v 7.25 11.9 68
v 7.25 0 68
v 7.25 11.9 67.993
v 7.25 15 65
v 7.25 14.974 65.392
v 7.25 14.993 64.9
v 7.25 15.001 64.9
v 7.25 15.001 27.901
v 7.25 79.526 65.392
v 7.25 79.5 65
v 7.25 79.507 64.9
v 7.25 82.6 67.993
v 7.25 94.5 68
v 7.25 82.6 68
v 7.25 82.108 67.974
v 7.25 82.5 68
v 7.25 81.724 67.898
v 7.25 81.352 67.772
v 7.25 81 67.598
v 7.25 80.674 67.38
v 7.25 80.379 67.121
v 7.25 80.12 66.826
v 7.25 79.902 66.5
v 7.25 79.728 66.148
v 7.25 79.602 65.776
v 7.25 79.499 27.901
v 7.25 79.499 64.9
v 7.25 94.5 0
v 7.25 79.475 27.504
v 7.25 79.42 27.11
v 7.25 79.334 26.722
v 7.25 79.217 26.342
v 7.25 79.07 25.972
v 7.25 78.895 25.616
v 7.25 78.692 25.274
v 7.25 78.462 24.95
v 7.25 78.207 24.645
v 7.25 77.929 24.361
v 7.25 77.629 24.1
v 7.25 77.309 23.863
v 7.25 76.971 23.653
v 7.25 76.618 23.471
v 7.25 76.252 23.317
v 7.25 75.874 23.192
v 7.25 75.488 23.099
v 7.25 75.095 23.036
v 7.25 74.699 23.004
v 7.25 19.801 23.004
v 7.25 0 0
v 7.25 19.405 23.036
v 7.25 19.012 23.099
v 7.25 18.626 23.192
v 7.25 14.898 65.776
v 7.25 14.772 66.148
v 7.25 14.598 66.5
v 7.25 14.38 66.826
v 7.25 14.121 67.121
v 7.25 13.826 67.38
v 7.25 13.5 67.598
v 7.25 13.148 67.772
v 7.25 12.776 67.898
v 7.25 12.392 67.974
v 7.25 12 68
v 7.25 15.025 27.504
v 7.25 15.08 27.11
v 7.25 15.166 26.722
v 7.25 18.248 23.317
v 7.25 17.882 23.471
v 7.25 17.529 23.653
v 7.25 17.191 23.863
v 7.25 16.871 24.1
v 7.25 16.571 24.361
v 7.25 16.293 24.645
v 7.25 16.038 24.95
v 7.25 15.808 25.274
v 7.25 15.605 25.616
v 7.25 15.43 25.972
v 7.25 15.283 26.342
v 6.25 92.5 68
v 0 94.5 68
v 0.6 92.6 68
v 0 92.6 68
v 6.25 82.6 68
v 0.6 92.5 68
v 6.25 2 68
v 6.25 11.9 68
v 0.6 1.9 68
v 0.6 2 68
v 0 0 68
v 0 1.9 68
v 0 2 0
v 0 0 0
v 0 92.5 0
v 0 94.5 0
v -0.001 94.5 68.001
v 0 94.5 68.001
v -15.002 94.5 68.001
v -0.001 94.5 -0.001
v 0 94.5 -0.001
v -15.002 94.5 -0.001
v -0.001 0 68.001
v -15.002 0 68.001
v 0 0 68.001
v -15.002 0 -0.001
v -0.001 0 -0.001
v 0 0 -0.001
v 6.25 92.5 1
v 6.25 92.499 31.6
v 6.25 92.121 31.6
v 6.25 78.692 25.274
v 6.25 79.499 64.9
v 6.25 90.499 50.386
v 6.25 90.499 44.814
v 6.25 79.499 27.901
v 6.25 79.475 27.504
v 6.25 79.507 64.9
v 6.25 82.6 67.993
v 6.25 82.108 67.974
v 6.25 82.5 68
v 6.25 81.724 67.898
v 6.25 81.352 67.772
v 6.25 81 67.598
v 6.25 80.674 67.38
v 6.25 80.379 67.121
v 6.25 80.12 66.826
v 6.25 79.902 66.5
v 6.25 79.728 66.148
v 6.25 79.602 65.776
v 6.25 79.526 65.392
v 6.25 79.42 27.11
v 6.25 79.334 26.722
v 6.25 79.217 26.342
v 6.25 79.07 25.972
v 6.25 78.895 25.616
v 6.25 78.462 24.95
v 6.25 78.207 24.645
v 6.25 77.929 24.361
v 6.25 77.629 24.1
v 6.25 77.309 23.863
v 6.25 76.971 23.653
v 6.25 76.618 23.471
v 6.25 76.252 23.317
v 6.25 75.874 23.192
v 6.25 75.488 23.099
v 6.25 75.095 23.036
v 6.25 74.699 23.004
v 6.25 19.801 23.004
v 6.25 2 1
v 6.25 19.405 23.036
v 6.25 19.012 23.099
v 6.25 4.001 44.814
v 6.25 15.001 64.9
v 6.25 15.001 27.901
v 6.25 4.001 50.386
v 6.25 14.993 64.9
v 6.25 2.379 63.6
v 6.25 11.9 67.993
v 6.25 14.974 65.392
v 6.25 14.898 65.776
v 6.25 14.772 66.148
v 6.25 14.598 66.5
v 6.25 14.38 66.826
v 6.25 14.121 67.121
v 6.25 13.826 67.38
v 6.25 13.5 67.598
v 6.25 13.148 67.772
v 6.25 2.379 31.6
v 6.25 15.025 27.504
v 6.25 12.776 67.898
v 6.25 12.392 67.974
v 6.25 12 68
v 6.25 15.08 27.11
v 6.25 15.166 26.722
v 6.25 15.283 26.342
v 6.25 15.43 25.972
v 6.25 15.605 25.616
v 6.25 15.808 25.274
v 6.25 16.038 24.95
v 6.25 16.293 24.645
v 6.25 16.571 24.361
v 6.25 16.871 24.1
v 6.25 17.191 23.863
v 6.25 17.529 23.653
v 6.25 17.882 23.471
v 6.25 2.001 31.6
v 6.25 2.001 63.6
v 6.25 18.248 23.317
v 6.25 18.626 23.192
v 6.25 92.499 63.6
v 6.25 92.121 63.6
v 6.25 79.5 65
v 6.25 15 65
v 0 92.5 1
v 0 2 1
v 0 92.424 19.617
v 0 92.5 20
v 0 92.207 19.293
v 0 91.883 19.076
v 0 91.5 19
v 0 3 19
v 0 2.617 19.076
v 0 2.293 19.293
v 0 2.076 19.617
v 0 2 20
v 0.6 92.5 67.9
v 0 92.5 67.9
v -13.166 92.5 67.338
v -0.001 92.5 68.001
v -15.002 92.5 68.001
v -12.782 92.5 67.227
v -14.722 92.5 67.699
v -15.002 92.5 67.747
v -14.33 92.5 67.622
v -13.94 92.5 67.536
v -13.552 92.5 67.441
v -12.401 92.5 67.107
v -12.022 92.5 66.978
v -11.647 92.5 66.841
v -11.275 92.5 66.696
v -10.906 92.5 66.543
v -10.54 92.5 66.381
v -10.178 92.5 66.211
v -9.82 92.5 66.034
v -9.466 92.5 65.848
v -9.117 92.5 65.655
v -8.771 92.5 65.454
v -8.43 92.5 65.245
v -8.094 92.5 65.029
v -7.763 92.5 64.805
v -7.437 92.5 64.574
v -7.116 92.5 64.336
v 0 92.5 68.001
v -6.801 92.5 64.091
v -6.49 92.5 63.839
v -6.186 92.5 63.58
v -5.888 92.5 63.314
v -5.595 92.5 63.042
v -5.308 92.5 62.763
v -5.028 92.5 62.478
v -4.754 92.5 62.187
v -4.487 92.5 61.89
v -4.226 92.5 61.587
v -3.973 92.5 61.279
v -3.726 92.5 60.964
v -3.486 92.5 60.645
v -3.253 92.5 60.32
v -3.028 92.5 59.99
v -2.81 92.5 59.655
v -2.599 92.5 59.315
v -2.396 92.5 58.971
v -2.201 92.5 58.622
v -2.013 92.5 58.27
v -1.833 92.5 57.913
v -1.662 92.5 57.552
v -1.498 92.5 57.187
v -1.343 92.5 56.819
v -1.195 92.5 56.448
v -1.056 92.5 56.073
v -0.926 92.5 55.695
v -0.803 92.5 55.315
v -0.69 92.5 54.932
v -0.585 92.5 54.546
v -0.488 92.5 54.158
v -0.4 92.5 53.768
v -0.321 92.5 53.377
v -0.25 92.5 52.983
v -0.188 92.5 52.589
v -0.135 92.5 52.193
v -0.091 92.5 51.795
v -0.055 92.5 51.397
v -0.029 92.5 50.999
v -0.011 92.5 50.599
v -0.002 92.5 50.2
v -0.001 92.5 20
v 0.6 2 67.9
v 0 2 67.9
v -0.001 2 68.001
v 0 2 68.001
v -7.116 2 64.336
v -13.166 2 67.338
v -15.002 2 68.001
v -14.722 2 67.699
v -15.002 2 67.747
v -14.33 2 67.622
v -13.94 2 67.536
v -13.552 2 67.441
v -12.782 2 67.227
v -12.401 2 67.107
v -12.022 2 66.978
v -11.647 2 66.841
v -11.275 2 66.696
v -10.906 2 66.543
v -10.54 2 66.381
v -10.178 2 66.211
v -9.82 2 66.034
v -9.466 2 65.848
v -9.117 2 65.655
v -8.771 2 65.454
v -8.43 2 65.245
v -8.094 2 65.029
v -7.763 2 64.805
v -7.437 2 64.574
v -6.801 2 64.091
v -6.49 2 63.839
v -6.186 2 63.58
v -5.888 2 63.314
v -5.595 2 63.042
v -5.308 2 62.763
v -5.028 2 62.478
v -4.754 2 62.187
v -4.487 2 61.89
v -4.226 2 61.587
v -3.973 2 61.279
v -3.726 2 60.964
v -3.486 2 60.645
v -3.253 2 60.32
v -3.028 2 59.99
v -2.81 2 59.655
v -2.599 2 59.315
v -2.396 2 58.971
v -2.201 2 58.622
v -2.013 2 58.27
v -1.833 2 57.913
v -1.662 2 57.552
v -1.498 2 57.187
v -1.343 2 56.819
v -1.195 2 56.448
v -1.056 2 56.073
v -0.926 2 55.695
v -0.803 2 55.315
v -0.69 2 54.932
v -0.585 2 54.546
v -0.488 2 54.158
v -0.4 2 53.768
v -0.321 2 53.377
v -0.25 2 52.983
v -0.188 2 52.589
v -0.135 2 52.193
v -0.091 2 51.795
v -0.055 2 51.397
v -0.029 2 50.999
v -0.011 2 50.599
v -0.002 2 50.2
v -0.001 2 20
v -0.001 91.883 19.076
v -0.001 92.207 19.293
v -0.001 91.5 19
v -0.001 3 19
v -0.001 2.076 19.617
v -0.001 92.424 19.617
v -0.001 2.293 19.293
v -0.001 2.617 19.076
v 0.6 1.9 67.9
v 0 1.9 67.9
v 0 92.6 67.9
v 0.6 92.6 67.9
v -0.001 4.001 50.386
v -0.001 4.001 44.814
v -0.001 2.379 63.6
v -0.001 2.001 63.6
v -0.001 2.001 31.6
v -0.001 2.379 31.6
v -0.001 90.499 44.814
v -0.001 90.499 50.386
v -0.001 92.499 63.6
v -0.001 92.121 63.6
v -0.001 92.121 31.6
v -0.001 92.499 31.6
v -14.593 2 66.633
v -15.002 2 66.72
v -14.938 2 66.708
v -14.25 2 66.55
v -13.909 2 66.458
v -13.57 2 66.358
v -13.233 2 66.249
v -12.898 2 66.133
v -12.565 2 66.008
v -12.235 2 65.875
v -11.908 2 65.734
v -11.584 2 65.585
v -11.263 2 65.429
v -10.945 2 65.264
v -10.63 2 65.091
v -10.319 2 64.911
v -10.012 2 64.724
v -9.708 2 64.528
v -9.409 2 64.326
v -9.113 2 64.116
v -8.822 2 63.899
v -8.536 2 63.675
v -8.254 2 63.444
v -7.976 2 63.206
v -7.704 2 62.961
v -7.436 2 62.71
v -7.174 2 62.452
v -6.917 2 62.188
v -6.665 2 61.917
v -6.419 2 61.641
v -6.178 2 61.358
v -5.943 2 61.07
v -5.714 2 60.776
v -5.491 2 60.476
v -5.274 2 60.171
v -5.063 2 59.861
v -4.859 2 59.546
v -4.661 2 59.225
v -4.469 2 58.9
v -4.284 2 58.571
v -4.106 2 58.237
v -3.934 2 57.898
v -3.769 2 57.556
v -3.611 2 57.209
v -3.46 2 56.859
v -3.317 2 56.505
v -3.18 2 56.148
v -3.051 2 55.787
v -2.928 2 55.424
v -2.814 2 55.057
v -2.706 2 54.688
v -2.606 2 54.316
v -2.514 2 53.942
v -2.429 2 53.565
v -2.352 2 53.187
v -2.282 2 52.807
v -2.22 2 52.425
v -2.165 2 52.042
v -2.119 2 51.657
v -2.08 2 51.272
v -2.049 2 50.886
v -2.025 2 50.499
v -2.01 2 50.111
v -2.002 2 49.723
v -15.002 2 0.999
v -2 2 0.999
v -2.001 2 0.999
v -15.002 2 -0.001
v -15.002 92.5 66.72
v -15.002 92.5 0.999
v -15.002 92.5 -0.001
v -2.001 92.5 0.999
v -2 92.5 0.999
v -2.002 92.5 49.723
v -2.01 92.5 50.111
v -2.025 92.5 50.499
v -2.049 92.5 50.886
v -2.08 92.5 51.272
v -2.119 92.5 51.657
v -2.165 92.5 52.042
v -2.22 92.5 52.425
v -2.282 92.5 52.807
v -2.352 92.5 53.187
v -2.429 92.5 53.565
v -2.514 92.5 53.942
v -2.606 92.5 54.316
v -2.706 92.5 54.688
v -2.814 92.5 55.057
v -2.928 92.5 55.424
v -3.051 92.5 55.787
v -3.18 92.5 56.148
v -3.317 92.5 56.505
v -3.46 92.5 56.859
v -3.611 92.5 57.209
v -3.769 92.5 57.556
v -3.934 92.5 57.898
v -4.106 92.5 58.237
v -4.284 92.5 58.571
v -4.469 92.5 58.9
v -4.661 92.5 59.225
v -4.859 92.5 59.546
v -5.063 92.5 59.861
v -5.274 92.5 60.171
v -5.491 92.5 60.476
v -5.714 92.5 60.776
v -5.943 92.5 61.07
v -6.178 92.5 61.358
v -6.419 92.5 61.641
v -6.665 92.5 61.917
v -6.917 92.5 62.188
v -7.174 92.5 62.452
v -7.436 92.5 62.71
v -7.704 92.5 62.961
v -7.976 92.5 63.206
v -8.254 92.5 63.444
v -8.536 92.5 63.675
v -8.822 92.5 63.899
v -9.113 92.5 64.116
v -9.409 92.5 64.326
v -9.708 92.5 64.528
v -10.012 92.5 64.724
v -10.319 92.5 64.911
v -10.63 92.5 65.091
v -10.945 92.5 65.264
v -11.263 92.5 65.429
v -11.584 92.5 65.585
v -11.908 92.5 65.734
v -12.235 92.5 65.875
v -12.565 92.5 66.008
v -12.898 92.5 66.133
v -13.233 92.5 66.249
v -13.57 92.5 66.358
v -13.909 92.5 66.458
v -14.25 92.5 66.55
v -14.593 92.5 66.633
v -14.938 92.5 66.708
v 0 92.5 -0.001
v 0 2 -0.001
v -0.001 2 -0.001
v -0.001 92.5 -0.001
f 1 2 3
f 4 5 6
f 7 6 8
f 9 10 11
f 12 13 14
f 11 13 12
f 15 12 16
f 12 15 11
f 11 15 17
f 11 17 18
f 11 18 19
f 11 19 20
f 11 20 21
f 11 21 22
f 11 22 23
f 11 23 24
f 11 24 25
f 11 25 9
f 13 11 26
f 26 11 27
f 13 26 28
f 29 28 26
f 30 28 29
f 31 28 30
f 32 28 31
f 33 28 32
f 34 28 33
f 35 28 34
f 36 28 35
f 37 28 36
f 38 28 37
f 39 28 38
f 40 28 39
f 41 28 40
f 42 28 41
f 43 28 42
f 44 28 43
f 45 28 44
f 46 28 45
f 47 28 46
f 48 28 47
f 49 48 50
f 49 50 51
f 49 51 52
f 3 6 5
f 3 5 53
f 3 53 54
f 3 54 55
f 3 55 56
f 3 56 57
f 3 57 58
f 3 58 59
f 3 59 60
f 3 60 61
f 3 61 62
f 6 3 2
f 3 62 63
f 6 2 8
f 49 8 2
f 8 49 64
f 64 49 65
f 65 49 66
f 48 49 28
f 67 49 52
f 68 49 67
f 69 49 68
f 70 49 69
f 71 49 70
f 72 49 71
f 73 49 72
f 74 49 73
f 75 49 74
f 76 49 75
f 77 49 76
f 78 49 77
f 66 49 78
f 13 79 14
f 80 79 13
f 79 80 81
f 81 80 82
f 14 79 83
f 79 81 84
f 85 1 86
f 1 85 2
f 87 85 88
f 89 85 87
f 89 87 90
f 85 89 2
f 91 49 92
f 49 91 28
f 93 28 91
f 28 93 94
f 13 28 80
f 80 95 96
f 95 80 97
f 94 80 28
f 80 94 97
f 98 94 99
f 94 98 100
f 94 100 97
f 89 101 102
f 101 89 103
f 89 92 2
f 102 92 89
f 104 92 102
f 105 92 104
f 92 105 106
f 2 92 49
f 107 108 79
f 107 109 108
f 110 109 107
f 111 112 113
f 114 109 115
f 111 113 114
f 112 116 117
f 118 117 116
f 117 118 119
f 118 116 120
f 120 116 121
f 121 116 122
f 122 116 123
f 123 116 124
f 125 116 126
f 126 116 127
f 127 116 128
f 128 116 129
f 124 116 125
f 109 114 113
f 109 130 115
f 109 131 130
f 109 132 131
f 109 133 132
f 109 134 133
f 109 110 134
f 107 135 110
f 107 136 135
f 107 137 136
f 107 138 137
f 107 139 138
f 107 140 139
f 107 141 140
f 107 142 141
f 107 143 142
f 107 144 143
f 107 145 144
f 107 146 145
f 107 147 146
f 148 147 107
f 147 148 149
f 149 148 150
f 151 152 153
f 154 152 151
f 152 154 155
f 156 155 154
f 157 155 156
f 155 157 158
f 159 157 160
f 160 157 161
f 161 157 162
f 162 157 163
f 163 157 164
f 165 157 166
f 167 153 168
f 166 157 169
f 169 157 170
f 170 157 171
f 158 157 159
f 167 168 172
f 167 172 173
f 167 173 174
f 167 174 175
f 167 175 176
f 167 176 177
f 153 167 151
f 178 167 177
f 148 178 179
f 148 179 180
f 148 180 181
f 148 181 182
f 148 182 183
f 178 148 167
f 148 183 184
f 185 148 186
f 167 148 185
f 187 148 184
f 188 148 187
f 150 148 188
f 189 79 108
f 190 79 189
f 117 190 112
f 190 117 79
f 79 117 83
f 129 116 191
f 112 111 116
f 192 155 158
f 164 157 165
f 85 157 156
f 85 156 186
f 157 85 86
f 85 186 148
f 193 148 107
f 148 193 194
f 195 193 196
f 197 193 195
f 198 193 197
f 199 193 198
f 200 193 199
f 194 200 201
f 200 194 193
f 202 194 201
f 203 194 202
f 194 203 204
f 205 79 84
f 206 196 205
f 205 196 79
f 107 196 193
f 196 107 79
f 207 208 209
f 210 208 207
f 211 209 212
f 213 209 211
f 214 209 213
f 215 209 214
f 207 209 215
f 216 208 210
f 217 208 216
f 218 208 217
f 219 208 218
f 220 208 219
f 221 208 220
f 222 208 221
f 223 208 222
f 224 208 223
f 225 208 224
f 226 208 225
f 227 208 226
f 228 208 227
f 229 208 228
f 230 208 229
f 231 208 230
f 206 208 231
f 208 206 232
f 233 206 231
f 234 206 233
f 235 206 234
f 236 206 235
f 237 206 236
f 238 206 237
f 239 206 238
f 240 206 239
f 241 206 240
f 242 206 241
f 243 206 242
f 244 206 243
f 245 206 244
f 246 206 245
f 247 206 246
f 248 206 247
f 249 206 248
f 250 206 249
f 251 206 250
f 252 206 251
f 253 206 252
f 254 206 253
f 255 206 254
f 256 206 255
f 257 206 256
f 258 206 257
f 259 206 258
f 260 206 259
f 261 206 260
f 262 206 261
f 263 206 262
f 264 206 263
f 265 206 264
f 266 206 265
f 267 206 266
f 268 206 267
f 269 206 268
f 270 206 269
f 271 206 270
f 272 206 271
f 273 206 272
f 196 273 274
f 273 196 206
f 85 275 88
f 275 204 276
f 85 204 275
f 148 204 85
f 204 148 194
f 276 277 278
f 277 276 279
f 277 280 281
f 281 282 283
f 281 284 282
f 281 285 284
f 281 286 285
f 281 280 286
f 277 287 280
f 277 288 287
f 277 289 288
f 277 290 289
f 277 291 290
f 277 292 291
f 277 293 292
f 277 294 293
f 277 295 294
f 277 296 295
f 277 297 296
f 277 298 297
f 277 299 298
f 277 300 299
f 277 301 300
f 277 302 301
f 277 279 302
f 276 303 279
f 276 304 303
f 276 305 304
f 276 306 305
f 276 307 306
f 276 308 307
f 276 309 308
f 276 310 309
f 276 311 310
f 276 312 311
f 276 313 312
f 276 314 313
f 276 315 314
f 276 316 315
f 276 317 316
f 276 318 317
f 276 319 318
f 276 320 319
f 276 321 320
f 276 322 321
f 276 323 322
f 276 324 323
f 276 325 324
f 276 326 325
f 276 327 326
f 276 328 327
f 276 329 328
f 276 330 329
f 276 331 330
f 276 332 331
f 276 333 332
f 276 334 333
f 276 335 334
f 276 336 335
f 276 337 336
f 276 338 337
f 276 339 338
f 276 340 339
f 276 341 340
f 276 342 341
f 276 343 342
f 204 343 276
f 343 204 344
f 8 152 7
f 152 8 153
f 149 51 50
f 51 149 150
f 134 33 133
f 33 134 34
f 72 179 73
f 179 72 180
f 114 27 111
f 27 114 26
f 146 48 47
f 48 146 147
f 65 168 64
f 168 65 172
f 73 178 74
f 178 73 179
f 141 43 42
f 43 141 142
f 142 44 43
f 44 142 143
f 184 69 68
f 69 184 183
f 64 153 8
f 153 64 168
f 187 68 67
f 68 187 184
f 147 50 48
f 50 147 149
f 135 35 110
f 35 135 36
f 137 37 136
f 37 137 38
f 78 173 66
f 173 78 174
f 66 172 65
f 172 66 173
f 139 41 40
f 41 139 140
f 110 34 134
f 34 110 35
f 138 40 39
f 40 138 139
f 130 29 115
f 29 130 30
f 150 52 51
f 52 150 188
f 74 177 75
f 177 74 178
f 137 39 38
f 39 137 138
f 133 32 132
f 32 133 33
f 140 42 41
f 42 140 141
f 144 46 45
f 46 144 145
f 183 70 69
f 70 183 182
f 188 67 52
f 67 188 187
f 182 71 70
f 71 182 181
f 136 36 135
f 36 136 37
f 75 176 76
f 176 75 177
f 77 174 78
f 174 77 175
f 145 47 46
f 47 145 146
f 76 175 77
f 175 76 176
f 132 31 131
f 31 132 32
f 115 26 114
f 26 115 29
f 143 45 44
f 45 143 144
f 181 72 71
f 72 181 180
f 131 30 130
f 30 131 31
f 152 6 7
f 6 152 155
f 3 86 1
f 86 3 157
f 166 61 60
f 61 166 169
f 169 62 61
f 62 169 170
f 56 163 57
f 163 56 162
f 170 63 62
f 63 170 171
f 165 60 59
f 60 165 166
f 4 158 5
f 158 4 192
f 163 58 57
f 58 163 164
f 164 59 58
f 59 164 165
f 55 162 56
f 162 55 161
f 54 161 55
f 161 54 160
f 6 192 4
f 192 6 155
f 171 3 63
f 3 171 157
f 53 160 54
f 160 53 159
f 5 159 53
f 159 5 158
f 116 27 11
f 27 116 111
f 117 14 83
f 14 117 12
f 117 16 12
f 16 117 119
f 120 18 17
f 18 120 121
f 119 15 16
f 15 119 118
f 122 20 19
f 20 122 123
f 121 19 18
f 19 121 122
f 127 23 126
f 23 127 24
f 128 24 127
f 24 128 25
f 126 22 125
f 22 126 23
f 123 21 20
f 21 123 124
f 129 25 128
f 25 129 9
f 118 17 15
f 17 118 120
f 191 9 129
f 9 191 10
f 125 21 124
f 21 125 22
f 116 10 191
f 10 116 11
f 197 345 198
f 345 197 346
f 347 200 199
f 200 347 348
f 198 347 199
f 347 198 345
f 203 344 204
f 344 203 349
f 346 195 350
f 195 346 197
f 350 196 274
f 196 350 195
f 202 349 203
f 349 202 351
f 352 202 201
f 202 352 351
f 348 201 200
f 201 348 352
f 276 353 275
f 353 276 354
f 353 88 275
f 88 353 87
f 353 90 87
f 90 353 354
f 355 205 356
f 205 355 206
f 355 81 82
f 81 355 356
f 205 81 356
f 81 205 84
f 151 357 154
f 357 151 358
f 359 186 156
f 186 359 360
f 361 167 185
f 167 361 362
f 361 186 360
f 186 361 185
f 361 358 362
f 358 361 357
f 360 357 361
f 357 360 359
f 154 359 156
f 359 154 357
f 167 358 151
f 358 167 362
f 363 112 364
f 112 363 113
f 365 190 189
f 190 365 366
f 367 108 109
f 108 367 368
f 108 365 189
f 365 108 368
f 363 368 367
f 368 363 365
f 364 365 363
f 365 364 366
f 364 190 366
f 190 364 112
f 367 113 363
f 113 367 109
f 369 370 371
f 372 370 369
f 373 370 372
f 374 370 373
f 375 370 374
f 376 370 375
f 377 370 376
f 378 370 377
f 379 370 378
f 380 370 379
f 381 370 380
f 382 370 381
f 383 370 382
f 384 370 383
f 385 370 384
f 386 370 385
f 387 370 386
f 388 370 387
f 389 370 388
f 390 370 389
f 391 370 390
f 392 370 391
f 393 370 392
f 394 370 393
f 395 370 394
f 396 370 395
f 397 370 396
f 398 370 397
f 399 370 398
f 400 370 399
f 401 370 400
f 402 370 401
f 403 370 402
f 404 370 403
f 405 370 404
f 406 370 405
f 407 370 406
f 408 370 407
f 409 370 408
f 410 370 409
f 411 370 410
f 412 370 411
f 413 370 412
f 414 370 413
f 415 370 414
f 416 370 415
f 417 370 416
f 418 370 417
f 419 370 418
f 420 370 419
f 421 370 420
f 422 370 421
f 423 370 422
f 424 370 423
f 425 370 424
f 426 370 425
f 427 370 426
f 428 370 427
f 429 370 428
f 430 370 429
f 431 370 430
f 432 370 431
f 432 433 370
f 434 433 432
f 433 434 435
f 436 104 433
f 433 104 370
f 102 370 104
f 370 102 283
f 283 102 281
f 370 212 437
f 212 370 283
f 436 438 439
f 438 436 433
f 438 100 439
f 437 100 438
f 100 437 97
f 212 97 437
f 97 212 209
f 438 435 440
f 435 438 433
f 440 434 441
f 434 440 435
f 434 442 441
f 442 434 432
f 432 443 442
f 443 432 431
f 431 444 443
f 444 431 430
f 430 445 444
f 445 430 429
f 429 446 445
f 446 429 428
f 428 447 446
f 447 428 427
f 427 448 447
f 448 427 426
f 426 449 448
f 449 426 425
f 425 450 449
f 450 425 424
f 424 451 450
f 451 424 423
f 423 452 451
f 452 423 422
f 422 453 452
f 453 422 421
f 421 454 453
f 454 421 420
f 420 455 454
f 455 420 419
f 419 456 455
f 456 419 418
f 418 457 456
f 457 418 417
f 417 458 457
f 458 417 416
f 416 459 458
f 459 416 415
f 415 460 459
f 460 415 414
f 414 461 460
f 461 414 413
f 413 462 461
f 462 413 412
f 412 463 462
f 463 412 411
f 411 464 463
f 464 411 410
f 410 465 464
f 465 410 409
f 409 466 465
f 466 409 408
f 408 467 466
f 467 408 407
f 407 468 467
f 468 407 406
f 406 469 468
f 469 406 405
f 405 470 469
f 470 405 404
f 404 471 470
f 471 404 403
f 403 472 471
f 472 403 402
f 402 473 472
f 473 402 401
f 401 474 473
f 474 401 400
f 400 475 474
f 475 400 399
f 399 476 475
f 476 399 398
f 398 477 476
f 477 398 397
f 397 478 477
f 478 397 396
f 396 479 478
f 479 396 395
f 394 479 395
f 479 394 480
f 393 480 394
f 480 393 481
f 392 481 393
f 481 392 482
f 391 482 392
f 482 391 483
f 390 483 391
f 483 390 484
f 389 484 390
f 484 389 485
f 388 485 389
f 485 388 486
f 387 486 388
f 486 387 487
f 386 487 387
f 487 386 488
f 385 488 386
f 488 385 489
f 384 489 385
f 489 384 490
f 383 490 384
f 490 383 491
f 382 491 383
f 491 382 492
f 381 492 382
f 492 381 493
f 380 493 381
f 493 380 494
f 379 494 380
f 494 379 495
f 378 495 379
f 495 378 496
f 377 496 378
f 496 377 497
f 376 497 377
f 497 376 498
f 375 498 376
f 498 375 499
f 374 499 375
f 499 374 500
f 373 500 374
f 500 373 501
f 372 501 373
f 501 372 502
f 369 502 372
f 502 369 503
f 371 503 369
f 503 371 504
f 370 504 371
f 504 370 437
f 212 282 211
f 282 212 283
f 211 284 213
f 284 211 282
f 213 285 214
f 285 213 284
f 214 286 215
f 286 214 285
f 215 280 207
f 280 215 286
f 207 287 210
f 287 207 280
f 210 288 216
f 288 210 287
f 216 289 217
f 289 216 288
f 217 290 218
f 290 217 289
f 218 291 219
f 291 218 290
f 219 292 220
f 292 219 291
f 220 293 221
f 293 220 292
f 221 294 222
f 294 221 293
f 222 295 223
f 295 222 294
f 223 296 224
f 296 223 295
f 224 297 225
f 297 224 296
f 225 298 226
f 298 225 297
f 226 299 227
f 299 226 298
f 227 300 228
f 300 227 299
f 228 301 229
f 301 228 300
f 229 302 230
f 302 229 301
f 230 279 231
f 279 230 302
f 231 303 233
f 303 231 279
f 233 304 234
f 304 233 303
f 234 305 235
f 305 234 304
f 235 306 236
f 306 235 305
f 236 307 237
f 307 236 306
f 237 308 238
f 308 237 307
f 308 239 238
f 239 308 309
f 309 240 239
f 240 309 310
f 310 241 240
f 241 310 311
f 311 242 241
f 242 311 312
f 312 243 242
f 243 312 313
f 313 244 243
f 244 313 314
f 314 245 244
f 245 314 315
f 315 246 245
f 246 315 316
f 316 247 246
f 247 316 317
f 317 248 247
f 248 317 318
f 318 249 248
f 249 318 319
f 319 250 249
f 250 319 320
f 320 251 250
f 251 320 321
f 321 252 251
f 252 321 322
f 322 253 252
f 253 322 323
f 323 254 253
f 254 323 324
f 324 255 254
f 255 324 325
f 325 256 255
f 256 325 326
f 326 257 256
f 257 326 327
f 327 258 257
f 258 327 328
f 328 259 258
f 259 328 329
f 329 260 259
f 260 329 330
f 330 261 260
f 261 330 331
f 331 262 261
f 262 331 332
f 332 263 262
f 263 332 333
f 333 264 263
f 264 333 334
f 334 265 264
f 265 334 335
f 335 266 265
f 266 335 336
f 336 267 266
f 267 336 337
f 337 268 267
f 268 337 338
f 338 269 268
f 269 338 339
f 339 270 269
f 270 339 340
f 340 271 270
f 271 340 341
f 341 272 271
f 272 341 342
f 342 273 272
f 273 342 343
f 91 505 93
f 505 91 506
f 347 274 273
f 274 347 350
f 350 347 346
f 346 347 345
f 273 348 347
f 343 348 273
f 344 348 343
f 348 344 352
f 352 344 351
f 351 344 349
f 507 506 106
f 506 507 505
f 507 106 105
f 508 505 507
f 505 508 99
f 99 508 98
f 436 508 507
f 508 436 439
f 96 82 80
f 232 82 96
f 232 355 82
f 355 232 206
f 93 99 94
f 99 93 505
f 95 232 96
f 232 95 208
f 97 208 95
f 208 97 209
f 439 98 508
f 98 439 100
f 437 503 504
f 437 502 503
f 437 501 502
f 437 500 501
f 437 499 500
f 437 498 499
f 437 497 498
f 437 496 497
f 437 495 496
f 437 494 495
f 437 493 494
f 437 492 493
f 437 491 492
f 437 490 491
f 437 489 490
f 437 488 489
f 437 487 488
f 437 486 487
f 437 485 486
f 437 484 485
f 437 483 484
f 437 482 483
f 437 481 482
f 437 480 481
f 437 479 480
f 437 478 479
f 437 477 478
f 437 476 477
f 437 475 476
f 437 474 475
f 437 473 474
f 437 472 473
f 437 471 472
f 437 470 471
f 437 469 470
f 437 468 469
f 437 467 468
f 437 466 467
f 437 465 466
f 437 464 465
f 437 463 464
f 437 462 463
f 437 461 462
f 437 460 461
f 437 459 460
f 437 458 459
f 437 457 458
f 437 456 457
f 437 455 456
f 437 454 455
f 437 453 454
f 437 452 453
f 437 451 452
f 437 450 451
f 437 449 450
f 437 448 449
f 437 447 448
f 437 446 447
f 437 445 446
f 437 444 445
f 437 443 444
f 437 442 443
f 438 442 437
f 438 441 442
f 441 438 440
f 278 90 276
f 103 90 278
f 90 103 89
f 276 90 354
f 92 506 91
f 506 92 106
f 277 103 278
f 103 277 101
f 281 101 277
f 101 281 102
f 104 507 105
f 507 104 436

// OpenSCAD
// cubitos
use <mylib.scad>;

p = .001;
pp = 2 * p;
t0 = 1;
f = .18;
sqrt3 = sqrt(3);    // 1.732
sqrt3_2 = sqrt3/2;  // .866

// box size and placement constraint (3x4 grid in square box)
wmax = 285/4;    // 95 (w0 < wmax)
hmax = 285/3;    // 71 (h0 < hmax)

w00 = 88;  // official card size [long dimension]
h00 = 63;  // official card size [short dimension]

t00 = .4;  // card thickness: sleeves bring thickness to ~.625 per card. (from min .4mm)
t01 = .625; // thickness when stacking sleeved cards 

// euroPoker size (with sleeves):
// width of card
w0 = 90.5;
// height of card
h0 = 66;
bt = 10 * t01 + 2 * t0; //
bw = w0; // total length of box (y-extent @ loc = 2)
bh = h0; // height of box (short dimension of card + bottom(t0) + top(3mm))


// box for setup (Events, VICI, markers, chips) cards:
// vt = box thick (~ t01 * number of cards + 2*t0) x-extent
// vw = box width (long dimension of card + 2*t0)  y-extent
// vh = box height (short dimension of card + bottom(t0) + top(3mm)) z-extent
module vbox(vt0 = bt, vw0 = bw, vh0 = bh, txyz = t0)
{
  ta = is_list(txyz) ? txyz : [txyz, txyz, txyz];
  tx = ta.x; ty = ta.y; tz = ta.z;
  vt = vt0 + 2 * tx; // external x-extent
  vw = vw0 + 2 * ty;
  vh = vh0 + 2 * tz;
  echo("------ vbox: vt= ", vt, "vw=", vw, "vh=", vh);
  // vt: interior x-extent
  module cardGuide(vt = vt0+pp) {
    // w0 size of inset; squeeze
    // h0 height of flat part
    // h1 height of taper part
    w0 = 2; h0 = 4; h1 = 7; a = 7;
    vh2 = vh * .7;
    // TODO: the trig to calc height of green cube (depends on angle a)
    difference() {
    translate([w0/2 + p, 0, vh2]) color("green") cube([w0, vt, h0 + 4 * h1], true);
    trr([w0, 0, vh2+h1+h0, [0, -a, 0]]) color ("pink") cube([w0, vt+pp, h0 + 2 * h1], true);
    trr([w0, 0, vh2-h1-h0, [0, a, 0]]) color ("pink") cube([w0, vt+pp, h0 + 2 * h1], true);
    }
  }
  // slotify the walls:
  vl = vt;
  sw = vw-30;   // width of slot 
  dh = 50;      // depth of slot (below the radius of tray)
  sr = min(5, dh/2, sw/2); // radius of slot
  hwtr0 = [dh, vw-2*ty, 2*tz, 1]; // ]height, width, translate, rotate]
  hwtr1 = [dh, vw-30, 2*tz, sr]; // ]height, width, translate, rotate]
  ss = false;   // show slot

  { 
    // slotted box with card guides:
    slotify(hwtr0, [00+tx/2, vw/2, vh-(dh/2-tz)], 1, 0, ss)
    slotify(hwtr1, [vl-tx/2, vw/2, vh-(dh/2-sr)], 1, 3, ss)
    box([vt, vw, vh], ta);
    translate([vt/2,  0+ty, 0 ]) rotate([0,0, 90]) cardGuide();
    translate([vt/2, vw-ty, 0 ]) rotate([0,0,-90]) cardGuide();
  }
}

// tray is a rounded tube (kut) with end caps [from civo_tray]
// size: [x: length, y: width_curved, z: height_curved]
// rt: radii of tray [bl, tl, tr, br]
// rc: radii of caps
// k0: cut_end default: cut max(top radii) -> k
// txyz: (t0 -> [t0, t0, t0])
module tray(size = 10, rt = 2, rc = 0, k0, txyz = t0) {
 ta = is_list(txyz) ? txyz : [txyz, txyz, txyz];
 s0 = is_list(size) ? size : [size, size, size]; // tube_size
 s = [s0.x, s0.y, s0.z];
 rm = is_list(rt) ? max(rt[1], rt[2]) : rt;   // round_max of tl, bl
 k = is_undef(k0) ? -rm : k0;
 translate([s[0], 0, 0])
 rotate([0, -90, 0])
 roundedTube([s.z, s.y, s.x], rt, k, ta);

 // endcaps
 hw0 = [s.z, s.y, 0];
 hwx = [s.z, s.y, s.x];
 div(hw0, rc, k, ta.x);
 div(hwx, rc, k, ta.x);
}
module die(trr = [0,0,0]) {
  trr(trr)
  color("red") roundedCube(12);
}

module lid(h = h0, w = w0 ) {
  module hinge() {
    bs = 4; // base size
    az = 2; // axle z
    inset = 6; tabl = 4;
    trr([h - bs, 0, 1]) cube([bs, w, bs]); // offset
    color ("green") trr([h+inset , -1-p, bs, [-90, 0,0]]) cylinder(h = w+pp, r = 2);
    // trr([h+inset, -1-p, bs])  cube([tabl, w+2*t0+pp, az]); // axle
    trr([h - bs, 0, bs]) cube([bs+inset, w, az]);
  }
  
    color ("pink") cube([h, w, 1]); // base
    hinge();

}

// allow for 12 cards per color, * .625 = 7.5mm
loc = 2;
tv = 2;
atrans(loc, [[-t0, 0, 0], [0, 0, 0, [0, 90, 0]], 0])
vbox(10 * t01, bw, bh, [t0, tv, t0]);

tl = w0;
ht = 15;   // height of tray
rt = 18;   // radius of scoop
zt = ht+rt;   // z-extent before kut
tt = 1;
atrans(loc, [[0 - p, tl+2*tv, 0, [90, 0, -90]], [0, tl, 0, [0, 0, -90]], 0])
color("blue") 
tray([tl+2*tt, bh+2*tt, zt], [0, rt, 1, 1], 0, undef, [tv, tt, tt]);

*atrans(loc, [[-h0-ht-5, t0, 0], 0, 0])
lid(h0, w0);

dup([0, 15, 0])
atrans(loc, [undef, [2, 2* t0, t0], 0])
die();
